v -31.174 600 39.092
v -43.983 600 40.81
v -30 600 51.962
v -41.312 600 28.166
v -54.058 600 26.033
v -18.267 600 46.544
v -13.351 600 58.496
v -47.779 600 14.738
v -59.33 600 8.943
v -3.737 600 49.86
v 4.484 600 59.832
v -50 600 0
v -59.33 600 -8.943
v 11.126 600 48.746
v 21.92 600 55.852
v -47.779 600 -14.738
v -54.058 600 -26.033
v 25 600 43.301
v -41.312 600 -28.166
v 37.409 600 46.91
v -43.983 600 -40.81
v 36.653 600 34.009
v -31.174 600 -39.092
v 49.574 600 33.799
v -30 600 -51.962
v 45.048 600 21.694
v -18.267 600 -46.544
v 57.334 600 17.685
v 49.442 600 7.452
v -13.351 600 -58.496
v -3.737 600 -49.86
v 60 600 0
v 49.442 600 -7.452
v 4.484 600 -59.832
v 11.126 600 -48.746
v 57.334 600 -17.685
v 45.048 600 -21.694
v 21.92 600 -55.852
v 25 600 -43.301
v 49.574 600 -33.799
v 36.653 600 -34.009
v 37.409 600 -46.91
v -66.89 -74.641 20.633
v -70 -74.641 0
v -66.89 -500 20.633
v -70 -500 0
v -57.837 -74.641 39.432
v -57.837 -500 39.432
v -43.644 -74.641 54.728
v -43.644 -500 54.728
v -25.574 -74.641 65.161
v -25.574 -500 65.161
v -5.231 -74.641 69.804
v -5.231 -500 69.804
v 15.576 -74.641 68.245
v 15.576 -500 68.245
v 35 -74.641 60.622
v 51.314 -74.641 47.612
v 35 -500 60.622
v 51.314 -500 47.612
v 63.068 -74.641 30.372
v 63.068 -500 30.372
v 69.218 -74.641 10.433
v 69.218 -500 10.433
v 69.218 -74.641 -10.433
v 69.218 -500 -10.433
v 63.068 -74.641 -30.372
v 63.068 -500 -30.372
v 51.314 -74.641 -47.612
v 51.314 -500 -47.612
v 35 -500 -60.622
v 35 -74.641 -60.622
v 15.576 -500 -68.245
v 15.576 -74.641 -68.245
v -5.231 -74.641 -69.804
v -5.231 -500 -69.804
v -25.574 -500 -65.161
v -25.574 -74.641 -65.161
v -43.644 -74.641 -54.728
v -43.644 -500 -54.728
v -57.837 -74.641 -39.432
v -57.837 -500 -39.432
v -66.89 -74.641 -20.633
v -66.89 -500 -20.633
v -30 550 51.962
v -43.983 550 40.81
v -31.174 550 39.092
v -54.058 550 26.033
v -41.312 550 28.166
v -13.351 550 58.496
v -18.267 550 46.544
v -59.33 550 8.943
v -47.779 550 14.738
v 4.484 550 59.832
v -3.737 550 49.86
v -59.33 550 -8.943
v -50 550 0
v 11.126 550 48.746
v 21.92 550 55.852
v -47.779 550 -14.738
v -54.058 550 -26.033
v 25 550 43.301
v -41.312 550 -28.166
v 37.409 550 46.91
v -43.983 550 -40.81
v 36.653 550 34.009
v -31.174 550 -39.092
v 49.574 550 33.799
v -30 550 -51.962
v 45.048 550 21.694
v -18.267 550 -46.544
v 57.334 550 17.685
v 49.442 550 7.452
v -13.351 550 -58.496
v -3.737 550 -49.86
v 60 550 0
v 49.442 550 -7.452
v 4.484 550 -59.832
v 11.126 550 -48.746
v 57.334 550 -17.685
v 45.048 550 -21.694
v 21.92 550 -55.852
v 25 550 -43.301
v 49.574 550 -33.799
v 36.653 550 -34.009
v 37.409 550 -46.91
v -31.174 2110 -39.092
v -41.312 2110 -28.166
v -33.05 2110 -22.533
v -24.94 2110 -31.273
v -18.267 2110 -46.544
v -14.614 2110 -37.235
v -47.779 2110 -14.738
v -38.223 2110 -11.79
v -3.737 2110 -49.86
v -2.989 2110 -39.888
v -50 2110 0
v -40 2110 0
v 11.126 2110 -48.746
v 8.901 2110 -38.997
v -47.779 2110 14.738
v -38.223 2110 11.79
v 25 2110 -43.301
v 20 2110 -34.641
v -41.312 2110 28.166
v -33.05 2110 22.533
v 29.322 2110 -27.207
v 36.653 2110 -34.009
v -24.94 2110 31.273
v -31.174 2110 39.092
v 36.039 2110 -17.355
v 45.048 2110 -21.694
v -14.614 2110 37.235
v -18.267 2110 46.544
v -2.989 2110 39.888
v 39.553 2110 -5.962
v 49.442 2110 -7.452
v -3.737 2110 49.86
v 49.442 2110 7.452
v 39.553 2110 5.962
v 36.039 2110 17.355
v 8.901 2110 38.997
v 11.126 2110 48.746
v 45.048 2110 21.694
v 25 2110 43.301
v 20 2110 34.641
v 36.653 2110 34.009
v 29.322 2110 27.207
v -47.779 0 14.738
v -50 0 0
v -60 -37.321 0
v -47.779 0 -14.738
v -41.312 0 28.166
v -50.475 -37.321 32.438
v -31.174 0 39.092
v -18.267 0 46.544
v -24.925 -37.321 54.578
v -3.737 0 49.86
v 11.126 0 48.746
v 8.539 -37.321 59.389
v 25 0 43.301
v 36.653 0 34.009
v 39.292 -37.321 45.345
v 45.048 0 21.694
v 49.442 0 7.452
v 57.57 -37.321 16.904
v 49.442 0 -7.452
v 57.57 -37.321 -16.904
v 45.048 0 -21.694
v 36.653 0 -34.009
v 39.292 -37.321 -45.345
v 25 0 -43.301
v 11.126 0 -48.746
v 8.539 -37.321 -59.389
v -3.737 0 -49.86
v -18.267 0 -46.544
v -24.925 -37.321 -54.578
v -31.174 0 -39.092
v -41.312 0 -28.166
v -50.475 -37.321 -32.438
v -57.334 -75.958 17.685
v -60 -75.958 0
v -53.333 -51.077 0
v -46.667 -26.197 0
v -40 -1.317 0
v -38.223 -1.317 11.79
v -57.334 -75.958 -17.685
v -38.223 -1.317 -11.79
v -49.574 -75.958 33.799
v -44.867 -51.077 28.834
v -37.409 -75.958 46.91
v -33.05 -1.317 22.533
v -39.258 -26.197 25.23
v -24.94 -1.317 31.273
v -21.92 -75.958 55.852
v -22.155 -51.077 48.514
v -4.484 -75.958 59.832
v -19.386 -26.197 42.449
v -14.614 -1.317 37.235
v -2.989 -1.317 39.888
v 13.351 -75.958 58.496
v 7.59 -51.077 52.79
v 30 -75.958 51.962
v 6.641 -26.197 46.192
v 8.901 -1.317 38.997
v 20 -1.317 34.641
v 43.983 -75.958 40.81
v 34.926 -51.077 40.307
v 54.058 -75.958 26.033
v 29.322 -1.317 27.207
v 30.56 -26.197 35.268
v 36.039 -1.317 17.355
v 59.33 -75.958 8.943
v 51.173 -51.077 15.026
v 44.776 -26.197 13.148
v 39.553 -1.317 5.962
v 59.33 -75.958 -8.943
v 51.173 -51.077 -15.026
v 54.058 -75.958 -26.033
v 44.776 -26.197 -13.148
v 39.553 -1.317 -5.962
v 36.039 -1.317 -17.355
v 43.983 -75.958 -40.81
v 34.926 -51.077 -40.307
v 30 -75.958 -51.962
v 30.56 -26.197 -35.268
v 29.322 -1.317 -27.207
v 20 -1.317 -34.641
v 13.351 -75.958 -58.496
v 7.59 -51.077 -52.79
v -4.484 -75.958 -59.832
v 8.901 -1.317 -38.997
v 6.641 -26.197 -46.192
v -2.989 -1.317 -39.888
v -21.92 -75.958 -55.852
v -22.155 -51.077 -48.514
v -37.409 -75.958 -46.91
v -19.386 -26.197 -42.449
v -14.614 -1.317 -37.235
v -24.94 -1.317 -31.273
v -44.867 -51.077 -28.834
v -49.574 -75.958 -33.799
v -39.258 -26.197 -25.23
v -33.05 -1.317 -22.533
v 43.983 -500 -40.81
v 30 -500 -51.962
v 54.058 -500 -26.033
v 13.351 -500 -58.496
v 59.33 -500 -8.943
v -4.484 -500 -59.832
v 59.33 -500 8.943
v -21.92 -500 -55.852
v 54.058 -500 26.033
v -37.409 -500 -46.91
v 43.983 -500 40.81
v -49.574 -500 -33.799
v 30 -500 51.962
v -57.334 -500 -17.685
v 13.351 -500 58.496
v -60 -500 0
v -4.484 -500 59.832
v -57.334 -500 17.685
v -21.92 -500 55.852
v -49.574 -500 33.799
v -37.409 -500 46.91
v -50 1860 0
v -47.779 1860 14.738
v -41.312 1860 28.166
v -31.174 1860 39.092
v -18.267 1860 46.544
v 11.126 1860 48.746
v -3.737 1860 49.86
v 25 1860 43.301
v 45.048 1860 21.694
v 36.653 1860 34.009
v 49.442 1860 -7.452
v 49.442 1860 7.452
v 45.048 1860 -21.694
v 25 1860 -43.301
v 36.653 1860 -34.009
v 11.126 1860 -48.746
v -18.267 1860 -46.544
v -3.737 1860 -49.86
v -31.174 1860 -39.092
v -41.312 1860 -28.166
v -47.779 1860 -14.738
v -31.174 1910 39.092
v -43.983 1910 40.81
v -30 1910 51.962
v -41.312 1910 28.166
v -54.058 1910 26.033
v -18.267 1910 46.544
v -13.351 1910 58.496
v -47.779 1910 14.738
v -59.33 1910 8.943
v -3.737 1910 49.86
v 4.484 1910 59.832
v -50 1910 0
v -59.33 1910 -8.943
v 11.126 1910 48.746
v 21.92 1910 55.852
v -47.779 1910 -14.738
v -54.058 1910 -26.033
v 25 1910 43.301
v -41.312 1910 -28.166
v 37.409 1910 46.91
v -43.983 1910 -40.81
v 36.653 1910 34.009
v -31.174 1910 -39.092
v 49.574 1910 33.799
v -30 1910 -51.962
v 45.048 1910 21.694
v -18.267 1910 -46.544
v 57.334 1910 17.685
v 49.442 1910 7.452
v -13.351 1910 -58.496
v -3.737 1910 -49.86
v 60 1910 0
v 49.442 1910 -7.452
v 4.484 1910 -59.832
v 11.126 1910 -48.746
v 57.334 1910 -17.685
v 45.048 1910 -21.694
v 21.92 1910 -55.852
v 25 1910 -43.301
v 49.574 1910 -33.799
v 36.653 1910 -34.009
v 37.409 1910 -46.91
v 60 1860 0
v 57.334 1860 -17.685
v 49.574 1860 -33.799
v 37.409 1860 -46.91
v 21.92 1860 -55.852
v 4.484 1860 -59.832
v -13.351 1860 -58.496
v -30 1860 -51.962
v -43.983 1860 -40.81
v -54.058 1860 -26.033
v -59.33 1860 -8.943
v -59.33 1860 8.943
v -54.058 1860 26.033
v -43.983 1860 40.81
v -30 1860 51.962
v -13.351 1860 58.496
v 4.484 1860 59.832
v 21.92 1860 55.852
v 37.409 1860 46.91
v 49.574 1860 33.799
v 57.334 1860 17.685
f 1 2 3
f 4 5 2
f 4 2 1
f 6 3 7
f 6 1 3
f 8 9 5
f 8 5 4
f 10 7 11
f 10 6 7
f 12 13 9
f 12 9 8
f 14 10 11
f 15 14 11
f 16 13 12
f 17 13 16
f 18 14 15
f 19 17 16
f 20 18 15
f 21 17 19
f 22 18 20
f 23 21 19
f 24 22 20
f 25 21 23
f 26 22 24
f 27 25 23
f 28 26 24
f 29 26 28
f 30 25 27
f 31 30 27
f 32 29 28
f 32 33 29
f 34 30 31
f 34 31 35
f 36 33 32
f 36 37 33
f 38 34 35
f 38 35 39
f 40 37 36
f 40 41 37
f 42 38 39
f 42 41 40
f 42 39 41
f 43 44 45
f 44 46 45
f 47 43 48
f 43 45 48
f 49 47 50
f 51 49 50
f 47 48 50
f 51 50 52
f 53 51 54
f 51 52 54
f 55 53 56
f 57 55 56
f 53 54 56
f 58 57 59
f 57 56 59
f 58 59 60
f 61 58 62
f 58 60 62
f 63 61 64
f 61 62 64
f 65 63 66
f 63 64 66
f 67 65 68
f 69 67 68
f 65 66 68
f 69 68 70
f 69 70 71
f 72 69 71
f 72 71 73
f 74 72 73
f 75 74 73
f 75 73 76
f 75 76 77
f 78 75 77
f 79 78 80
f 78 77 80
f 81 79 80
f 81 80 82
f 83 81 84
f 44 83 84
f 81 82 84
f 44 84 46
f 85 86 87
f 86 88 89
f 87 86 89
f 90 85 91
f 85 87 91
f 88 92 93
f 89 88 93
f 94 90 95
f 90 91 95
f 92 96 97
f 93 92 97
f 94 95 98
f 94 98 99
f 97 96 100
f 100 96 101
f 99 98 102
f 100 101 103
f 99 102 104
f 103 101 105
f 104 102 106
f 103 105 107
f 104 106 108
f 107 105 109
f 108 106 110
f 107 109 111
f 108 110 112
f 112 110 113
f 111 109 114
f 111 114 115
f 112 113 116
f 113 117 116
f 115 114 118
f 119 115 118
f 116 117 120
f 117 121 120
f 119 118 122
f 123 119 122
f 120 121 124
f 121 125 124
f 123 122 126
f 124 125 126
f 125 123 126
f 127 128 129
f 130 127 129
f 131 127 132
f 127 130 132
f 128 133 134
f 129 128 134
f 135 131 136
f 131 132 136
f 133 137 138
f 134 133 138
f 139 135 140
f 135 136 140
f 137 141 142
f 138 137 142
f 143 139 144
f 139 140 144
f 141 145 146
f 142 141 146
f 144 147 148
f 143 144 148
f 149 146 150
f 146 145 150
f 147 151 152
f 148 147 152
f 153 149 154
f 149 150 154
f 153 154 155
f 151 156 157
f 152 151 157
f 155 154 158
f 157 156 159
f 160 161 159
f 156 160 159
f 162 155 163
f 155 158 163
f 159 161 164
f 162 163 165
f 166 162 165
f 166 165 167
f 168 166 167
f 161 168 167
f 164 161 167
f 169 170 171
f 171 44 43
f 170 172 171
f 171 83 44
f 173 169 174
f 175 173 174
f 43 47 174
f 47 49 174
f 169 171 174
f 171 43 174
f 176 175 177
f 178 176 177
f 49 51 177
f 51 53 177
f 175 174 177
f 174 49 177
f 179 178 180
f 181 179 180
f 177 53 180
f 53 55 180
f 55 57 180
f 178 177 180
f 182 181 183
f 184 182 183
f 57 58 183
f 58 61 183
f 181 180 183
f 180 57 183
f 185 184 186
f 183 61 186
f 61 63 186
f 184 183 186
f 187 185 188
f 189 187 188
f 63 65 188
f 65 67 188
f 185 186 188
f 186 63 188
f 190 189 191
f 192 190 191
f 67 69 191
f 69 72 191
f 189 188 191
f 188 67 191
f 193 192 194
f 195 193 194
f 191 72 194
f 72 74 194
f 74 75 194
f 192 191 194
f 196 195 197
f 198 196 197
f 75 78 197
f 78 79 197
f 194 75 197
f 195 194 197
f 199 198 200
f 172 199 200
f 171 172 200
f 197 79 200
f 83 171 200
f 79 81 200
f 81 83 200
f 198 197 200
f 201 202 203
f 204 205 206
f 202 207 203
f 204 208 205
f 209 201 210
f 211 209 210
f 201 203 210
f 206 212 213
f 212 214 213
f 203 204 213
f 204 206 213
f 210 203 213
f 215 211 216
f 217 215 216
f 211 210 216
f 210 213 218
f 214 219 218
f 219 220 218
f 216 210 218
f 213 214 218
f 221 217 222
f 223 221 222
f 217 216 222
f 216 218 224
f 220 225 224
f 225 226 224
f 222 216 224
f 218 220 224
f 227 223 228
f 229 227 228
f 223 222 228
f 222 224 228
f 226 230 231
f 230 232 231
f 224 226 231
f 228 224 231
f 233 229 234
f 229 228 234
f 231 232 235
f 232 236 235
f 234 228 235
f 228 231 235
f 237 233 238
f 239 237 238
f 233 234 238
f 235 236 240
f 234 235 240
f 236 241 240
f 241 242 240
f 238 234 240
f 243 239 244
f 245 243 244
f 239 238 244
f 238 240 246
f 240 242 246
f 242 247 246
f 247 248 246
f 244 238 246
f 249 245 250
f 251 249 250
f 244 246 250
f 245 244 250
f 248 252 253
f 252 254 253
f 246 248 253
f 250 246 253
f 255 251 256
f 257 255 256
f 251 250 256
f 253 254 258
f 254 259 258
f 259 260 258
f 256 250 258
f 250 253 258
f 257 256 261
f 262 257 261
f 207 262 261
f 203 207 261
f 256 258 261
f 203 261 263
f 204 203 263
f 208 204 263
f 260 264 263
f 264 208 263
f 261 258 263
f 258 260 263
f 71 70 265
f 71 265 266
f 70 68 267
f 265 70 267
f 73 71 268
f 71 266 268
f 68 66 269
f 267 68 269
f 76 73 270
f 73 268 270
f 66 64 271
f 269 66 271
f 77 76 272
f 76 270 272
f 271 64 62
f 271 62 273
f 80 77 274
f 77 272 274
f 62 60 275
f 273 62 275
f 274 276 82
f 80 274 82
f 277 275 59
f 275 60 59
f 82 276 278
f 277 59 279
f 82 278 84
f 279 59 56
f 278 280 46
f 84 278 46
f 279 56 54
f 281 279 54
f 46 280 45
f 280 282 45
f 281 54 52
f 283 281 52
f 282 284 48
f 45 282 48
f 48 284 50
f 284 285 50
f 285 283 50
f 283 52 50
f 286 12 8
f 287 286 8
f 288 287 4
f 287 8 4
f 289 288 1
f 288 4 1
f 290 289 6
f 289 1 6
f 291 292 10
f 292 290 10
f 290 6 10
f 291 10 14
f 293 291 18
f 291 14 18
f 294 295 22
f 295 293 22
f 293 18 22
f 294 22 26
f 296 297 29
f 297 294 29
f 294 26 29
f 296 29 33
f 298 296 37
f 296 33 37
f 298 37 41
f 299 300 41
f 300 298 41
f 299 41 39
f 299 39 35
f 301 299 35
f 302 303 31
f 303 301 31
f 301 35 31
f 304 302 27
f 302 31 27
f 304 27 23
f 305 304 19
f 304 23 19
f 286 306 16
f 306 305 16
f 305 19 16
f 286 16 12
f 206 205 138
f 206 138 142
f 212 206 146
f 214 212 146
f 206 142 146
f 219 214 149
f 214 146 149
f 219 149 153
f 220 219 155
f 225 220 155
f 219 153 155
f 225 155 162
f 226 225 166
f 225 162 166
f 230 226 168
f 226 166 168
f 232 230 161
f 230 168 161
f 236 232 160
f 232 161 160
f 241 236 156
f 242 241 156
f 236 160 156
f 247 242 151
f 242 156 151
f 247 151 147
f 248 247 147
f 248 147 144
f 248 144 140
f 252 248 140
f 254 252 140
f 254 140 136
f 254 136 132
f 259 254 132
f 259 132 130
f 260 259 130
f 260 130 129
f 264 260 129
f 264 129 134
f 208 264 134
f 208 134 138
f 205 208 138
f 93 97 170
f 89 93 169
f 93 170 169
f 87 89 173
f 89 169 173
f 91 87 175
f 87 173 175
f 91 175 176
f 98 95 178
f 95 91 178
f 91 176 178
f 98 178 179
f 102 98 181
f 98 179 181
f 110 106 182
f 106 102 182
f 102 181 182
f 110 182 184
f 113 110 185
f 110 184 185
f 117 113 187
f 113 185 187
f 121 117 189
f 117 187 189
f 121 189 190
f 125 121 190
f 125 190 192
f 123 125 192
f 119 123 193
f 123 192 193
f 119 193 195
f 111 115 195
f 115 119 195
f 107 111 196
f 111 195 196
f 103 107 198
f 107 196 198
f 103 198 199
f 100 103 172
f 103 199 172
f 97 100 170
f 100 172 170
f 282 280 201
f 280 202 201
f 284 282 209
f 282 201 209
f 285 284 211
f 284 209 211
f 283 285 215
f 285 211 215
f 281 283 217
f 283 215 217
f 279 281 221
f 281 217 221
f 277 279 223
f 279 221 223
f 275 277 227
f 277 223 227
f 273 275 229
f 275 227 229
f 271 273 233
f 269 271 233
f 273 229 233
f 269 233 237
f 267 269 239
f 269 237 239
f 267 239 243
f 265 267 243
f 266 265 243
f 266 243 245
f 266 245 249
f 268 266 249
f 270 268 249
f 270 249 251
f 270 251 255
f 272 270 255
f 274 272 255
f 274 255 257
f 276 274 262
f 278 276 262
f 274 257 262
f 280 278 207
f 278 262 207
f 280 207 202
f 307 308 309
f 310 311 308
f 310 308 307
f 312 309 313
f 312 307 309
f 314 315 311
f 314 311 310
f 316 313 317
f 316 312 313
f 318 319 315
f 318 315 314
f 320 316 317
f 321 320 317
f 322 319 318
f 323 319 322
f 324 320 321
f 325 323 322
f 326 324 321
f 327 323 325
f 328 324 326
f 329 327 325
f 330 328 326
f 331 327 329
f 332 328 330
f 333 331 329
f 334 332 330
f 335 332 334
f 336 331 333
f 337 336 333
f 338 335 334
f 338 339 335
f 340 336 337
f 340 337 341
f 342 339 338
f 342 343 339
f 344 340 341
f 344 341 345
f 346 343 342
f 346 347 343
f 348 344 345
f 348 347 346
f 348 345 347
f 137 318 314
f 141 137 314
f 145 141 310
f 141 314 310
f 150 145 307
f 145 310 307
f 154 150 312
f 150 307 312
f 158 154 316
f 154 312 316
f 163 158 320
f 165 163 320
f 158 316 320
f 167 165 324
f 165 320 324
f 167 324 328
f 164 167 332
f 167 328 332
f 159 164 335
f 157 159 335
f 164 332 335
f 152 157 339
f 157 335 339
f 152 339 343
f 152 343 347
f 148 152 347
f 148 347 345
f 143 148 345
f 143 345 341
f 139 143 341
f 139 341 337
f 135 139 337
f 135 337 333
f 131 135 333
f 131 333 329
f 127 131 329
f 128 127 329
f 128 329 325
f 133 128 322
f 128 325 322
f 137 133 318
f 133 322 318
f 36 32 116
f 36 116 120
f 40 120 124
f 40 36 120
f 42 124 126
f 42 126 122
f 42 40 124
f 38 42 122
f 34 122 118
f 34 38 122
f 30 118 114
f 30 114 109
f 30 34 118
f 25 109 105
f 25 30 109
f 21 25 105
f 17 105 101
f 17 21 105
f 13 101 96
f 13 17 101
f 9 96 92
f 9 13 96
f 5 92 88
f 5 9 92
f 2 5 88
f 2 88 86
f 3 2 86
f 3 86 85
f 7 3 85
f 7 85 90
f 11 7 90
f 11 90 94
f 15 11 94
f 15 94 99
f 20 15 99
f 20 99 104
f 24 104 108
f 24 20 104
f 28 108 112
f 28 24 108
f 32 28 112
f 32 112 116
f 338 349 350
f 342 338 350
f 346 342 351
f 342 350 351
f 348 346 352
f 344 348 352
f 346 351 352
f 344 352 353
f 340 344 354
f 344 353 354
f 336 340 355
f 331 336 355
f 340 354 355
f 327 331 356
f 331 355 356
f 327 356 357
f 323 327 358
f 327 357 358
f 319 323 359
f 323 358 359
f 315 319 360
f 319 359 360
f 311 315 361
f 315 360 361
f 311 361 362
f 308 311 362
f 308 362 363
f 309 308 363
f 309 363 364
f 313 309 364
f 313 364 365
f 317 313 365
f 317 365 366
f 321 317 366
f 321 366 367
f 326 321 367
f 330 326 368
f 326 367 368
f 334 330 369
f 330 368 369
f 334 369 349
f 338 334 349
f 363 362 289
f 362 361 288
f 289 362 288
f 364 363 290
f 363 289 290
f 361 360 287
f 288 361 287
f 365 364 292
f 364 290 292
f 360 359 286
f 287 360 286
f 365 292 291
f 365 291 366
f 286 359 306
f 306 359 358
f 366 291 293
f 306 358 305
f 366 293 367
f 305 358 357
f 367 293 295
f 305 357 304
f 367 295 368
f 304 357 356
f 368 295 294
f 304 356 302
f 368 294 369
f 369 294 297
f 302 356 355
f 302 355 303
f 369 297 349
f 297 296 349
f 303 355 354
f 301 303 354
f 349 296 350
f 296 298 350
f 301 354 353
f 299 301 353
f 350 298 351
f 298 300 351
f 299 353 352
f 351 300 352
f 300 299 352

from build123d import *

# Parameters (mm, degrees)
SKETCH3_R           = 60
SKETCH3_R_2         = 40
BOSS_EXTRUDE1_DEPTH = 50
SKETCH4_R           = 60
SKETCH4_R_2         = 40
BOSS_EXTRUDE3_DEPTH = 50


with BuildPart() as part:
    # Sketch1 → Revolve1 (revolve)
    with BuildSketch(Plane.XY):
        Polygon((-70, -74.641016151), (-70, -500), (-60, -500), (-60, -75.957541127), (-40, -1.316524976), (-40, 2110), (-50, 2110), (-50, 0), align=None)
    revolve(axis=Axis((0, 0, 0), (0, 1, 0)))

    # Sketch3 → Boss-Extrude1 (add)
    with BuildSketch(Plane(origin=(0, 1860, 0), x_dir=(1, 0, 0), z_dir=(0, 1, 0))):
        Circle(SKETCH3_R)
        Circle(SKETCH3_R_2, mode=Mode.SUBTRACT)
    extrude(amount=BOSS_EXTRUDE1_DEPTH)

    # Sketch4 → Boss-Extrude3 (add)
    with BuildSketch(Plane(origin=(0, 600, 0), x_dir=(1, 0, 0), z_dir=(0, 1, 0))):
        Circle(SKETCH4_R)
        Circle(SKETCH4_R_2, mode=Mode.SUBTRACT)
    extrude(amount=-BOSS_EXTRUDE3_DEPTH)


solid = part.part
